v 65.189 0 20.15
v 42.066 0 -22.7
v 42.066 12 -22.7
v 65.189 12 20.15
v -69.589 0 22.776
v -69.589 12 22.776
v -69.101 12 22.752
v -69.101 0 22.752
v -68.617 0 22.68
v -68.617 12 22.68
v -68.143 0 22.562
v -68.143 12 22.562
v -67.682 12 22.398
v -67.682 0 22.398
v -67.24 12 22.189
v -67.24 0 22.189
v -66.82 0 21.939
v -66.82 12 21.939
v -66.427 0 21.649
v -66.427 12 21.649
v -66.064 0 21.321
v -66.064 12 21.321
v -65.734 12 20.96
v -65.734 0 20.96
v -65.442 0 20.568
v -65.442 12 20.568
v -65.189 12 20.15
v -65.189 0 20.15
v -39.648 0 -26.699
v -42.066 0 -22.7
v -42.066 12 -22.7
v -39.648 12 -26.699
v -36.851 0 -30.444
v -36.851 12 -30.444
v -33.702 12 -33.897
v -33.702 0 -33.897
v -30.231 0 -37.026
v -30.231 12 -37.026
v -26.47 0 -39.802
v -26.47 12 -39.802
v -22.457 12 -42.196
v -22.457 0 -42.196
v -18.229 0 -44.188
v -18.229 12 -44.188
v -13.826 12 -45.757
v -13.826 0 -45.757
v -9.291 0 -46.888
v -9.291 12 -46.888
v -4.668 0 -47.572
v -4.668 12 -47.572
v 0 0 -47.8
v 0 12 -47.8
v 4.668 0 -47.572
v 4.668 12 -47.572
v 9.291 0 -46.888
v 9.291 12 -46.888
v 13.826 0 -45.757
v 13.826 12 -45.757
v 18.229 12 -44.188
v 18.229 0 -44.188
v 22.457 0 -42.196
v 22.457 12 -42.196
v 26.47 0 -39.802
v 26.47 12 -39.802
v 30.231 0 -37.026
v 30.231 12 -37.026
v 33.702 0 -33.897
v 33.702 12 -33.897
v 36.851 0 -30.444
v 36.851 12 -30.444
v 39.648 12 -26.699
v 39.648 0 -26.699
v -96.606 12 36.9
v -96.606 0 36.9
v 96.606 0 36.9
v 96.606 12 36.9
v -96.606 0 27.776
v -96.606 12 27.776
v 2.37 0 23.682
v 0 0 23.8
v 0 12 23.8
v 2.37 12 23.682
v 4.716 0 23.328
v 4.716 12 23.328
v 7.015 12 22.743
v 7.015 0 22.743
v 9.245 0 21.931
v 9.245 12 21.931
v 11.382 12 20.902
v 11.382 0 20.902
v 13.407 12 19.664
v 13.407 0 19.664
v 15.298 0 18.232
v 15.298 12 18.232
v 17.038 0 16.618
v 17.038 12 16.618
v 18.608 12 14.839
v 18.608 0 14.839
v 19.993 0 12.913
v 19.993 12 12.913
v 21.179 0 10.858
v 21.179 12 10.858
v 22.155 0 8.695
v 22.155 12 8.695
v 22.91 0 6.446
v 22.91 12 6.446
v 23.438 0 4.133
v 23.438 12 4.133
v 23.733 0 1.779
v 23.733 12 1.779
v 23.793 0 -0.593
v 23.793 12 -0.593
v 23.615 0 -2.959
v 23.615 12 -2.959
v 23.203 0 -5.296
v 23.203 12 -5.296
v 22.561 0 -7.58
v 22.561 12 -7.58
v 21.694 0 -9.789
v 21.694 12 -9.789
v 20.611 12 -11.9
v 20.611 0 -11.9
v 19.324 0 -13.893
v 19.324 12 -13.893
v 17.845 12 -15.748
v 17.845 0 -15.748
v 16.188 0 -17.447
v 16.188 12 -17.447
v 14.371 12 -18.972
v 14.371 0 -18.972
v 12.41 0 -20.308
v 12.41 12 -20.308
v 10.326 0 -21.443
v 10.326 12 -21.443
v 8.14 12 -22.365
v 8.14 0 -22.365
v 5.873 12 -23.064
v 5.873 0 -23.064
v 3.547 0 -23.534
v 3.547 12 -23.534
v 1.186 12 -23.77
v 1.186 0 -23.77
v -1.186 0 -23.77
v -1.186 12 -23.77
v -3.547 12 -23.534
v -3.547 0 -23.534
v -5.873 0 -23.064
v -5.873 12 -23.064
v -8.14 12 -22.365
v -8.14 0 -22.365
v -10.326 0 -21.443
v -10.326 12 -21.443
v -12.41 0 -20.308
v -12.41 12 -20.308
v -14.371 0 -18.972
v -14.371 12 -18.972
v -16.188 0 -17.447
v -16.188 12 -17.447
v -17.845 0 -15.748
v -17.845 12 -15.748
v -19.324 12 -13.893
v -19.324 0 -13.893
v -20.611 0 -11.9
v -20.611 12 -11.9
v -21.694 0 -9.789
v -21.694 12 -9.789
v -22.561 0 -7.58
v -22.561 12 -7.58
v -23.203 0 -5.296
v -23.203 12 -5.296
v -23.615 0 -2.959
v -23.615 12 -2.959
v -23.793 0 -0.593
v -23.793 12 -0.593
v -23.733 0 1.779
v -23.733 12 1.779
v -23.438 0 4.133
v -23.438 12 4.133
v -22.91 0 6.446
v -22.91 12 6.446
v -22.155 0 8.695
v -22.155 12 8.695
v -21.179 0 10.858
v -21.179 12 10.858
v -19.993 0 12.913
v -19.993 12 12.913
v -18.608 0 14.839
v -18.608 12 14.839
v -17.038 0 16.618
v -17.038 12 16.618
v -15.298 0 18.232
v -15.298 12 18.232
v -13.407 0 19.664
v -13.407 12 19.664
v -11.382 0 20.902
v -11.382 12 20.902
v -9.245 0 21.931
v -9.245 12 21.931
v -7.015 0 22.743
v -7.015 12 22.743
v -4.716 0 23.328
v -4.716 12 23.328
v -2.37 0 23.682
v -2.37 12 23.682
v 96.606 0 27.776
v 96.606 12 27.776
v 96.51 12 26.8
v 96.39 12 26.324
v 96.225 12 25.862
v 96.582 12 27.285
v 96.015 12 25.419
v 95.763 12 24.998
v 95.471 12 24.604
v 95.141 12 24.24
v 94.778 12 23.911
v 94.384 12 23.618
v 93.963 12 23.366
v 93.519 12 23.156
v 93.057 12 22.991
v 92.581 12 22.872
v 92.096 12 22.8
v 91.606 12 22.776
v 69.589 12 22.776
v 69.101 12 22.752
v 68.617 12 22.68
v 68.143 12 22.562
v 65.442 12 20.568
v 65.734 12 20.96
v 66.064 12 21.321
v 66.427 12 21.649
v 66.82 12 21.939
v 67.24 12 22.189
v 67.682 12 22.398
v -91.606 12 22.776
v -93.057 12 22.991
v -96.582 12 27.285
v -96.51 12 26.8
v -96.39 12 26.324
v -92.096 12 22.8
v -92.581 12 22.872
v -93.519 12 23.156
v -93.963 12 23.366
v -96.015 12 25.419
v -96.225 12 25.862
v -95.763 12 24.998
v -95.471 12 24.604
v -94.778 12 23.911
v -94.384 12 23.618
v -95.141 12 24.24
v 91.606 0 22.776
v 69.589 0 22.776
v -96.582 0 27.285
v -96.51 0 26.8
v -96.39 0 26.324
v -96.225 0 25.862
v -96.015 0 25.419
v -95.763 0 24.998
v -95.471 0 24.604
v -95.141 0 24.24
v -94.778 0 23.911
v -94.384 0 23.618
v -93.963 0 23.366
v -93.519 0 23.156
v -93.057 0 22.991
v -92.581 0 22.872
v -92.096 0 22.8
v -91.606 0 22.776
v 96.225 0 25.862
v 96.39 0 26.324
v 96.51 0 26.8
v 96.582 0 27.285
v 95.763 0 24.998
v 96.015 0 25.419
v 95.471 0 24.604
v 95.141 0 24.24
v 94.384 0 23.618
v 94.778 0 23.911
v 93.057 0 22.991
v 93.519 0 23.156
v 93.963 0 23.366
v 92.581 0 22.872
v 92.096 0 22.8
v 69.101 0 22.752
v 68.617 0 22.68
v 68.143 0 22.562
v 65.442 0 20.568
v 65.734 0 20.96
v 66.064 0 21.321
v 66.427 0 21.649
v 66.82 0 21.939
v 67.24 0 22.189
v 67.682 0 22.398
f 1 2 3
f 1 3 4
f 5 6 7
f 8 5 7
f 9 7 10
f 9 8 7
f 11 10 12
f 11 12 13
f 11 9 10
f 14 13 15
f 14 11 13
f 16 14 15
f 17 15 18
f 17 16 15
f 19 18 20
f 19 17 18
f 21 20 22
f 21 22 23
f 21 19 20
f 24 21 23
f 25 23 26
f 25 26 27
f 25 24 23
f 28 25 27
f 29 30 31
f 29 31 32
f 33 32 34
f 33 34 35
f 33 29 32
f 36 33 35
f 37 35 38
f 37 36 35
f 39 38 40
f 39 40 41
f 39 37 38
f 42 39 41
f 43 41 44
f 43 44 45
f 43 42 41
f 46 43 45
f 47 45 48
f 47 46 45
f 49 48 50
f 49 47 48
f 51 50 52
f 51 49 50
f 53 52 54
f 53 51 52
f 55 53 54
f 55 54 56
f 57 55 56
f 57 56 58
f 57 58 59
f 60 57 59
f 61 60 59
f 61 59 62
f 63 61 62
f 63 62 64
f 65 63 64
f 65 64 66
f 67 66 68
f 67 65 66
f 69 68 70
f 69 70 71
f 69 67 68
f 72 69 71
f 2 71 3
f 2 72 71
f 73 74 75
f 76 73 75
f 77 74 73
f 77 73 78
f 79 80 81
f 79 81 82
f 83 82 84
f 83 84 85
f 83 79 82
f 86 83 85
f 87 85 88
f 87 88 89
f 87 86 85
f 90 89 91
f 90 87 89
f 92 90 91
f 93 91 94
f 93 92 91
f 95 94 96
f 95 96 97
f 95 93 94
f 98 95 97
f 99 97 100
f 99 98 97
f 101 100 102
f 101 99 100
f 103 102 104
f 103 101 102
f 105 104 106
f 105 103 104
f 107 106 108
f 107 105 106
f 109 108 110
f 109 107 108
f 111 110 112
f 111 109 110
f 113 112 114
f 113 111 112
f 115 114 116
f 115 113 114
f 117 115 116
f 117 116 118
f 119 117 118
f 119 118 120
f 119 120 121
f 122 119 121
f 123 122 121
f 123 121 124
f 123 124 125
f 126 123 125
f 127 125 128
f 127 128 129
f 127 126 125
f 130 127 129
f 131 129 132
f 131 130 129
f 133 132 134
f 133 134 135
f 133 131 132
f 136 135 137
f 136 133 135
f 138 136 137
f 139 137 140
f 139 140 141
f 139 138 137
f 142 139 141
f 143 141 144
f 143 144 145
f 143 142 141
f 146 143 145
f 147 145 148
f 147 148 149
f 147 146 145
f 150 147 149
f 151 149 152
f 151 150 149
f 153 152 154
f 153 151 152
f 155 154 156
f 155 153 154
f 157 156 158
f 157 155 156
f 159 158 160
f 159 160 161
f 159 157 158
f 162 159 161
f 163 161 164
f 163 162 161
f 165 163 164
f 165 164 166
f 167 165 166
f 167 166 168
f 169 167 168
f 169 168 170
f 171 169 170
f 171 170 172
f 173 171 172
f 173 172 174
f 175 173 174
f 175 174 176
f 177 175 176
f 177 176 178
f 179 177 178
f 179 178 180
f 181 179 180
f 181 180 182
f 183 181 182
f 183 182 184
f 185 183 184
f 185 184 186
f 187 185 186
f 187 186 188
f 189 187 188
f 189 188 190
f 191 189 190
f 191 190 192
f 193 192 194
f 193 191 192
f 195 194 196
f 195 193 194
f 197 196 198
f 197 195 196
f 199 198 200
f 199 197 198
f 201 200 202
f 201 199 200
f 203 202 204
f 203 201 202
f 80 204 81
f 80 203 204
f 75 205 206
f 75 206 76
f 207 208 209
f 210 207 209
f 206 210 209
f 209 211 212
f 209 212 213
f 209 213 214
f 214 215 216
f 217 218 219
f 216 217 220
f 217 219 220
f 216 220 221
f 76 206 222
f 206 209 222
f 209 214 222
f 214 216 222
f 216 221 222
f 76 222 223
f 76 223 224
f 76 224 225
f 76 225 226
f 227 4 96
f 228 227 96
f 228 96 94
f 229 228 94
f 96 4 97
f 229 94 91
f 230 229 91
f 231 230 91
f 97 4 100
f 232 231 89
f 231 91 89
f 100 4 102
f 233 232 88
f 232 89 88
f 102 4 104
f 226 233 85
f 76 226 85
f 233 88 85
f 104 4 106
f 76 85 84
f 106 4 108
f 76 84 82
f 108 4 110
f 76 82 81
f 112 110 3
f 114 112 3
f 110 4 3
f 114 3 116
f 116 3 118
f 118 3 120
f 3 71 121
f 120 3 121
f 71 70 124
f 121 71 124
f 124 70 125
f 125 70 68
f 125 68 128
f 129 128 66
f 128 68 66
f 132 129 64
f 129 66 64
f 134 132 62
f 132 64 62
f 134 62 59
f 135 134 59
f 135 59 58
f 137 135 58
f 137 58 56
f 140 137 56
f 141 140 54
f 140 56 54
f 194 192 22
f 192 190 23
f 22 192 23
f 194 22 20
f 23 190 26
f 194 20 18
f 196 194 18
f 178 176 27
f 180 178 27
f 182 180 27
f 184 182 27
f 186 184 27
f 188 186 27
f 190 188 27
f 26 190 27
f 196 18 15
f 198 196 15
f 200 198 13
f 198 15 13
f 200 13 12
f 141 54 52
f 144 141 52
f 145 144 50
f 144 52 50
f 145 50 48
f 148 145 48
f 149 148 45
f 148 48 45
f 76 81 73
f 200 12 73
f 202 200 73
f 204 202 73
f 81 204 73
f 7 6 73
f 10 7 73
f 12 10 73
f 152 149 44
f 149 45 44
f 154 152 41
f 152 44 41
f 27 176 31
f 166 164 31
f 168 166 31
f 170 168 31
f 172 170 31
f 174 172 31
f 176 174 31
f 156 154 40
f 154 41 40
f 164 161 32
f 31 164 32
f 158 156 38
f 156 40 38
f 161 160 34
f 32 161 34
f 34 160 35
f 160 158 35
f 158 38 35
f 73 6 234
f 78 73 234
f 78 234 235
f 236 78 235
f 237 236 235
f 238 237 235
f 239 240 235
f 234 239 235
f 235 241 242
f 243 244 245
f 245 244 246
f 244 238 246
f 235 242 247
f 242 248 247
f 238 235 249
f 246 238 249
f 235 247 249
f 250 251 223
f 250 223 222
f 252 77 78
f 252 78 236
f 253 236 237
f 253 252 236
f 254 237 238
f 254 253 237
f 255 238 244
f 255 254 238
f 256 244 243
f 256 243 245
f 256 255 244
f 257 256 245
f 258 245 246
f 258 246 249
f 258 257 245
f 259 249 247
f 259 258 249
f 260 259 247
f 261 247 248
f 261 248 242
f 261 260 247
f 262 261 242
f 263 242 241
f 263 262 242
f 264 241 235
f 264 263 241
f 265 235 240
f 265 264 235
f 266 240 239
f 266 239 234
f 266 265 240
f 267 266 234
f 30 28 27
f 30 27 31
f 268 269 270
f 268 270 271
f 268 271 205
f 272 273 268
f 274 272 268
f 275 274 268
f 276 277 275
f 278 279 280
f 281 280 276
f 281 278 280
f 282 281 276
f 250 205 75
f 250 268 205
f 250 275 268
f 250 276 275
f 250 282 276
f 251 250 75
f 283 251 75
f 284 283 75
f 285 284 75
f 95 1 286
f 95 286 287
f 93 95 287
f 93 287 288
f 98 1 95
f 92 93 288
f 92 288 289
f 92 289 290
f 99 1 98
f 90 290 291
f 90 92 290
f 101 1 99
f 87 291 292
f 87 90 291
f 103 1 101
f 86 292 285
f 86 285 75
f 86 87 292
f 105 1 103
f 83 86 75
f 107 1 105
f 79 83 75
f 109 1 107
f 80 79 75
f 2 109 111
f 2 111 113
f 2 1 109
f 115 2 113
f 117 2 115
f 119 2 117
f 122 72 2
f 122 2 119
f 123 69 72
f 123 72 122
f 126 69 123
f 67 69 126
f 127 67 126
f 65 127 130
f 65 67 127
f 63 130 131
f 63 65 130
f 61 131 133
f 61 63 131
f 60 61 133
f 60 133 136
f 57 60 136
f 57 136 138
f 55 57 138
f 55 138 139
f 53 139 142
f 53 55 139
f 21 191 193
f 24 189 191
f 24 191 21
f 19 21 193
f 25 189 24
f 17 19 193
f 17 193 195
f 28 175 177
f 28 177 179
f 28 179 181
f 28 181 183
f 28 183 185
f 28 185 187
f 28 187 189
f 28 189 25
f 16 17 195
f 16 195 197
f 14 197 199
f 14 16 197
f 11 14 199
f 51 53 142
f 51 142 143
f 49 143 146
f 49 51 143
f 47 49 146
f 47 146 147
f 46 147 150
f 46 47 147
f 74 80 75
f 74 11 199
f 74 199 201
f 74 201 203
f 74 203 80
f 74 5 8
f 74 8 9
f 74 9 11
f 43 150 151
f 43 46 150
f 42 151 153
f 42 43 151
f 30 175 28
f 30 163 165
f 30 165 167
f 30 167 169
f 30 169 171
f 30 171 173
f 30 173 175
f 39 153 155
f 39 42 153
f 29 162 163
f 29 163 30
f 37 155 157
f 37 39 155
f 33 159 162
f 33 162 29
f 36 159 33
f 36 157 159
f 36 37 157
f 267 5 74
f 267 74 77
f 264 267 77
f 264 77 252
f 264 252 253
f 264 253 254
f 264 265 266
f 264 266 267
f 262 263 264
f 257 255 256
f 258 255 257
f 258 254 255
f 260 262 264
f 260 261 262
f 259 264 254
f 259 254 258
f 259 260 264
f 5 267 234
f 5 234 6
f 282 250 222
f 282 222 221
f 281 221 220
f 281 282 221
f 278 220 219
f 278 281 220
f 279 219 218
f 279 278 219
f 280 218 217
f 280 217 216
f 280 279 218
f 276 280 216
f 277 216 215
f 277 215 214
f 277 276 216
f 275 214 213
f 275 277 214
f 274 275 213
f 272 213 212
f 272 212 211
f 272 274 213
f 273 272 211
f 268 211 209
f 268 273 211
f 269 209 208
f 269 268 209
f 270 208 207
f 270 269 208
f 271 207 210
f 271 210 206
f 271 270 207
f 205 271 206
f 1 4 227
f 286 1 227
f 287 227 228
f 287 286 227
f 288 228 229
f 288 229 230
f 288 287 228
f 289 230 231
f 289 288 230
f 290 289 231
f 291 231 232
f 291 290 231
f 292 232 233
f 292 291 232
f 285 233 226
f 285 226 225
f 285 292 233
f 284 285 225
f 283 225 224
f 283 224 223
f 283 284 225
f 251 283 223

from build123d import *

# Parameters (mm, degrees)
SKETCH1_R           = 23.8
BOSS_EXTRUDE1_DEPTH = 12
SKETCH2_W           = 268.538723742
SKETCH2_H           = 56.355455055
CUT_EXTRUDE1_DEPTH  = 26


with BuildPart() as part:
    # Sketch1 → Boss-Extrude1 (new body)
    with BuildSketch(Plane(origin=(0, 0, 0), x_dir=(1, 0, 0), z_dir=(0, 1, 0))):
        with BuildLine():
            Line((65, -39.8), (-65, -39.8))
            Line((-65, -39.8), (-96.605676951, -39.8))
            Line((-96.605676951, -39.8), (-96.605676951, -27.775552827))
            ThreePointArc((-96.605676951, -27.775552827), (-95.141210857, -24.240018922), (-91.605676951, -22.775552827))
            Line((-91.605676951, -22.775552827), (-69.589095412, -22.775552827))
            ThreePointArc((-69.589095412, -22.775552827), (-67.027094411, -22.069286735), (-65.188875184, -20.150013174))
            Line((-65.188875184, -20.150013174), (-42.066105387, 22.699840916))
            ThreePointArc((-42.066105387, 22.699840916), (0, 47.8), (42.066105387, 22.699840916))
            Line((42.066105387, 22.699840916), (65.188875184, -20.150013174))
            ThreePointArc((65.188875184, -20.150013174), (67.027094411, -22.069286735), (69.589095412, -22.775552827))
            Line((69.589095412, -22.775552827), (91.605676951, -22.775552827))
            ThreePointArc((91.605676951, -22.775552827), (95.141210857, -24.240018922), (96.605676951, -27.775552827))
            Line((96.605676951, -27.775552827), (96.605676951, -39.8))
            Line((96.605676951, -39.8), (65, -39.8))
        make_face()
        with Locations(Location((0, 0, 0), (0, 0, 270))):
            Circle(SKETCH1_R, mode=Mode.SUBTRACT)
    extrude(amount=BOSS_EXTRUDE1_DEPTH)

    # Sketch2 → Cut-Extrude1 (cut)
    with BuildSketch(Plane.XZ):
        with Locations((-8.696253547, 65.077727528)):
            Rectangle(SKETCH2_W, SKETCH2_H)
    extrude(amount=-CUT_EXTRUDE1_DEPTH, mode=Mode.SUBTRACT)


solid = part.part
